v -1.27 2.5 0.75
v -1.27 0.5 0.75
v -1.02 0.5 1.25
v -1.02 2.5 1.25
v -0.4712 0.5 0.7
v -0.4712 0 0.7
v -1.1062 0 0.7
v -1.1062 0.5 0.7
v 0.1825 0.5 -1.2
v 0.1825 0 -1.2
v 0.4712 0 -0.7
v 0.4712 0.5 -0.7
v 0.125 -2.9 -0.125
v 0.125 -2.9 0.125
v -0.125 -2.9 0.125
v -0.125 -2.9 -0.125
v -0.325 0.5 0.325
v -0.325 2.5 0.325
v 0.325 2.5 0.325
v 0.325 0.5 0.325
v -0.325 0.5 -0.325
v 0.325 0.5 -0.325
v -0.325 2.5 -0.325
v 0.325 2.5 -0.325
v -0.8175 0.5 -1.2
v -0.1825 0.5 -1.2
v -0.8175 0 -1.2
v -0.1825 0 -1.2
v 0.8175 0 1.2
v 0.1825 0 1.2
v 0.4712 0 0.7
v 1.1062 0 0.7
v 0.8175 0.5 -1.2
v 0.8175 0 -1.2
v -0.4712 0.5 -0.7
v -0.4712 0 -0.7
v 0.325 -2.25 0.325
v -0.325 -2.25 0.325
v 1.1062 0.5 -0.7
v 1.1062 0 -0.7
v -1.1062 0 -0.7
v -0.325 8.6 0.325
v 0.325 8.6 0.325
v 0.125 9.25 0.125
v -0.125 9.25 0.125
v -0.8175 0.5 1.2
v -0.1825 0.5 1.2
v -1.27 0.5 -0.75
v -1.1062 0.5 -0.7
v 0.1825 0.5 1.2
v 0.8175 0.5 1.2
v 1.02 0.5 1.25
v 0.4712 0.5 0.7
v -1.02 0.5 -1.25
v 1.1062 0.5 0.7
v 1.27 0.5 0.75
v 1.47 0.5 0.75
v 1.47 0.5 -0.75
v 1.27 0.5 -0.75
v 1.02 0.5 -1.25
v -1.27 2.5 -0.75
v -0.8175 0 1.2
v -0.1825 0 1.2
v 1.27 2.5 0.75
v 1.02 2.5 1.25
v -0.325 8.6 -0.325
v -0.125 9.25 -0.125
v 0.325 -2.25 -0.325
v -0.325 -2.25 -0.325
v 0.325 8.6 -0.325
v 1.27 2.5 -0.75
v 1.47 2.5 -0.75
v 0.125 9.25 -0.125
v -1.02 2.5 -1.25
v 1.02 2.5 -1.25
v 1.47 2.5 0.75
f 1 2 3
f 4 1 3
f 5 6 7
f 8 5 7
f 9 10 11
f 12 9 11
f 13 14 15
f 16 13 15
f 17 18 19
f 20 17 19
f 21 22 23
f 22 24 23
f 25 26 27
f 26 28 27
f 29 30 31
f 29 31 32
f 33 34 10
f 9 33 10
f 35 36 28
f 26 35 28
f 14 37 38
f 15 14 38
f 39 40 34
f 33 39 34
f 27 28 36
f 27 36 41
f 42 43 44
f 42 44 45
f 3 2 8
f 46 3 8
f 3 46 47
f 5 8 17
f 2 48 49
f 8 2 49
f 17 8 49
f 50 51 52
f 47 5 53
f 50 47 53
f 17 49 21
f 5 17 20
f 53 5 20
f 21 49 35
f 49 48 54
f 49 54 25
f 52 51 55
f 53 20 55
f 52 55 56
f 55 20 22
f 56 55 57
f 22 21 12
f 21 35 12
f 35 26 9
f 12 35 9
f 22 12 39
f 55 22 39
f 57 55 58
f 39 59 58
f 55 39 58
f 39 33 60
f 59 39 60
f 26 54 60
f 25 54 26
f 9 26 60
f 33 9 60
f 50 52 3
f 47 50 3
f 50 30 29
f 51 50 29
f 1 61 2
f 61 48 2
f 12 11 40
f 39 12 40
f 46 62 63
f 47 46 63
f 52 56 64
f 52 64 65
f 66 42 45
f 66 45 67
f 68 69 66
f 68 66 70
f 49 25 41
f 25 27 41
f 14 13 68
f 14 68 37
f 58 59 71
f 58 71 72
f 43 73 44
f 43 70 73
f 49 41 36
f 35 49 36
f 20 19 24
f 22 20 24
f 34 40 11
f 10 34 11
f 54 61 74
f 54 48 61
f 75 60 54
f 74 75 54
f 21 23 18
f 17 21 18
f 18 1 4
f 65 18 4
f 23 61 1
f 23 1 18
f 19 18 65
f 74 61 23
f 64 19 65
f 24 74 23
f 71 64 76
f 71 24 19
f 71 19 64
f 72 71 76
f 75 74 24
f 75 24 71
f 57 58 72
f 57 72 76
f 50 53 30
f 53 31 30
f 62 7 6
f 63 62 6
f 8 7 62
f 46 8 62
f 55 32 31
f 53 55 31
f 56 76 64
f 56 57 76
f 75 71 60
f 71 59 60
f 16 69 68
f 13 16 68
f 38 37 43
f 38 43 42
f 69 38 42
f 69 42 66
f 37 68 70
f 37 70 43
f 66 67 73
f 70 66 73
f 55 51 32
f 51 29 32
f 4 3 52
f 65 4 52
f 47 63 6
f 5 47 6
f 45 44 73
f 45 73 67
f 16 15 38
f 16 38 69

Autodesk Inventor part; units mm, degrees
ref_plane "YZ Plane" through (0, 0, 0) normal (1, 0, 0) x (0, 1, 0)
ref_plane "XZ Plane" through (0, 0, 0) normal (0, 1, 0) x (-1, 0, 0)
ref_plane "XY Plane" through (0, 0, 0) normal (0, 0, 1) x (1, 0, 0)
sketch "Sketch1" plane through (0, 0, 0) normal (0, 1, 0) x (-1, 0, 0)
  line L0 (1.02, 1.25) -> (1.27, 0.75)
  line L1 (-1.02, 1.25) -> (1.02, 1.25)
  line L2 (-1.27, -0.75) -> (-1.27, 0.75)
  line L3 (-1.02, -1.25) -> (-1.27, -0.75)
  line L4 (1.02, -1.25) -> (-1.02, -1.25)
  line L5 (1.27, -0.75) -> (1.02, -1.25)
  line L6 (1.27, 0.75) -> (1.27, -0.75)
  line L7 (1.02, 1.25) -> (1.27, 0.75)
  line L8 (-1.02, 1.25) -> (1.02, 1.25)
  line L9 (-1.27, 0.75) -> (-1.02, 1.25)
  line L10 (0.815, 1.2) -> (0.18, 1.2)
  line L11 (1.1037, 0.7) -> (0.815, 1.2)
  line L12 (0.4687, 0.7) -> (1.1037, 0.7)
  line L13 (0.18, 1.2) -> (0.4687, 0.7)
  line L14 (-0.815, 1.2) -> (-1.1037, 0.7)
  line L15 (-0.18, 1.2) -> (-0.815, 1.2)
  line L16 (-0.4687, 0.7) -> (-0.18, 1.2)
  line L17 (-1.1037, 0.7) -> (-0.4687, 0.7)
  line L18 (0.815, -1.2) -> (1.1037, -0.7)
  line L19 (0.18, -1.2) -> (0.815, -1.2)
  line L20 (0.4687, -0.7) -> (0.18, -1.2)
  line L21 (1.1037, -0.7) -> (0.4687, -0.7)
  line L22 (-0.815, -1.2) -> (-0.18, -1.2)
  line L23 (-1.1037, -0.7) -> (-0.815, -1.2)
  line L24 (-0.4687, -0.7) -> (-1.1037, -0.7)
  line L25 (-0.18, -1.2) -> (-0.4687, -0.7)
  line L26 (-0.325, 0.325) -> (0.325, 0.325)
  line L27 (0.325, 0.325) -> (0.325, -0.325)
  line L28 (-0.325, -0.325) -> (0.325, -0.325)
  line L29 (-0.325, 0.325) -> (-0.325, -0.325)
  point P0 (0, 0)
  point P1 (0, 0)
sketch "Sketch3" plane through (0, 0, 0) normal (0, 1, 0) x (-1, 0, 0)
  line L0 (1.1062, -0.7) -> (0.4712, -0.7)
  line L1 (0.4712, -0.7) -> (0.1825, -1.2)
  line L2 (0.1825, -1.2) -> (0.8175, -1.2)
  line L3 (0.8175, -1.2) -> (1.1062, -0.7)
  line L4 (0.5, -1.2) -> (0.5, -0.7) construction
  point P0 (0, 0)
  dimension "d58" = 120
  dimension "d60" = 0.7
  dimension "d61" = 0.635
  dimension "d62" = 0.5
  dimension "d65" = 0.5
extrude "PCB-Level" add sketch "Sketch3" along normal blind 0.5
mirror "PCB-Level-Mirror1" about plane through (0, 0, 0) normal (1, 0, 0) of "PCB-Level"
mirror "PCB_Level-Mirror2" about plane through (0, 0, 0) normal (0, 0, 1) of "PCB-Level", "PCB-Level-Mirror1"
sketch "Sketch4" plane through (0, 0.5, 0) normal (0, 1, 0) x (1, 0, 0)
  line L0 (-1.02, -1.25) -> (1.02, -1.25)
  line L1 (1.27, -0.75) -> (1.27, 0.75)
  line L2 (1.02, 1.25) -> (-1.02, 1.25)
  line L3 (-1.27, 0.75) -> (-1.27, -0.75)
  line L4 (-1.27, -1.25) -> (1.27, 1.25) construction
  line L5 (1.27, -1.25) -> (-1.27, 1.25) construction
  line L6 (1.27, -0.75) -> (1.02, -1.25)
  line L7 (1.27, 0.75) -> (1.02, 1.25)
  line L8 (-1.27, 0.75) -> (-1.02, 1.25)
  line L9 (-1.27, -0.75) -> (-1.02, -1.25)
  line L10 (-1.02, -1.25) -> (1.02, -1.25)
  line L11 (1.27, 0.75) -> (1.47, 0.75)
  line L12 (1.47, 0.75) -> (1.47, -0.75)
  line L13 (1.47, -0.75) -> (1.27, -0.75)
  line L14 (1.27, -0.75) -> (1.27, 0.75)
  line L15 (-1.27, -0.75) -> (-1.47, -0.75)
  line L16 (-1.47, -0.75) -> (-1.47, 0.75)
  line L17 (-1.47, 0.75) -> (-1.27, 0.75)
  line L18 (-1.27, 0.75) -> (-1.27, -0.75)
  point P0 (0, 0)
  dimension "d68" = 2.54
  dimension "d69" = 2.5
  dimension "d70" = 0.5
  dimension "d71" = 0.25
  dimension "d72" = 0.5
  dimension "d73" = 0.25
  dimension "d74" = 0.5
  dimension "d75" = 0.25
  dimension "d76" = 0.5
  dimension "d77" = 0.25
  dimension "d122" = 0.2
  dimension "d123" = 0.2
sketch "Sketch6" plane through (0, 0, 0) normal (0, 1, 0) x (-1, 0, 0)
  line L0 (0.325, -0.325) -> (-0.325, -0.325) projected
  line L1 (-0.325, -0.325) -> (-0.325, 0.325) projected
  line L2 (-0.325, 0.325) -> (0.325, 0.325) projected
  line L3 (0.325, 0.325) -> (0.325, -0.325) projected
  point P0 (0, 0)
extrude "Pin-Ext" add sketch "Sketch6" along normal blind 9.25 and the other way blind 2.9 separate body
chamfer "Chamfer1" distance 0.2 distance2 0.65 1 edges at (0, 9.25, -0.325) measured on face at (-0.1083, 9.25, -0.1083)
chamfer "Chamfer2" distance 0.2 distance2 0.65 1 edges at (-0.325, 9.25, 0.1) measured on face at (0.1083, 9.25, 0.175)
chamfer "Chamfer3" distance 0.2 distance2 0.65 1 edges at (0.1, 9.25, 0.325) measured on face at (0.175, 9.25, 0.175)
chamfer "Chamfer4" distance 0.2 distance2 0.65 1 edges at (0.325, 9.25, 0) measured on face at (0.175, 9.25, 0.0417)
chamfer "Chamfer5" distance 0.2 distance2 0.65 1 edges at (-0.325, -2.9, 0) measured on face at (-0.1083, -2.9, -0.1083)
chamfer "Chamfer6" distance 0.2 distance2 0.65 1 edges at (0.1, -2.9, 0.325) measured on face at (0.025, -2.9, -0.1083)
chamfer "Chamfer7" distance 0.2 distance2 0.65 1 edges at (0.1, -2.9, -0.325) measured on face at (0.025, -2.9, -0.175)
chamfer "Chamfer8" distance 0.2 distance2 0.65 1 edges at (0.325, -2.9, 0) measured on face at (0.025, -2.9, -0.0417)
extrude "Extrusion9" add sketch "Sketch4" along normal blind 2 contours L9 L3 L8 L2 L7 L1 L6 L0 | L1 L11 L12 L13 bodies 1
sketch "Sketch9" plane through (0, 2.5, 0) normal (0, 1, 0) x (1, 0, 0)
  line L0 (-0.325, 0.325) -> (-0.325, -0.325) projected
  line L1 (0.325, 0.325) -> (-0.325, 0.325) projected
  line L2 (0.325, -0.325) -> (0.325, 0.325) projected
  line L3 (-0.325, -0.325) -> (0.325, -0.325) projected
  point P0 (0, 0)
extrude "Extrusion10" cut sketch "Sketch9" against normal through all bodies 1
equation "\"d74\" = d72"
equation "\"d75\" = d73"
equation "\"d76\" = d72"
equation "\"d77\" = d73"
properties part number "A-Pin"
